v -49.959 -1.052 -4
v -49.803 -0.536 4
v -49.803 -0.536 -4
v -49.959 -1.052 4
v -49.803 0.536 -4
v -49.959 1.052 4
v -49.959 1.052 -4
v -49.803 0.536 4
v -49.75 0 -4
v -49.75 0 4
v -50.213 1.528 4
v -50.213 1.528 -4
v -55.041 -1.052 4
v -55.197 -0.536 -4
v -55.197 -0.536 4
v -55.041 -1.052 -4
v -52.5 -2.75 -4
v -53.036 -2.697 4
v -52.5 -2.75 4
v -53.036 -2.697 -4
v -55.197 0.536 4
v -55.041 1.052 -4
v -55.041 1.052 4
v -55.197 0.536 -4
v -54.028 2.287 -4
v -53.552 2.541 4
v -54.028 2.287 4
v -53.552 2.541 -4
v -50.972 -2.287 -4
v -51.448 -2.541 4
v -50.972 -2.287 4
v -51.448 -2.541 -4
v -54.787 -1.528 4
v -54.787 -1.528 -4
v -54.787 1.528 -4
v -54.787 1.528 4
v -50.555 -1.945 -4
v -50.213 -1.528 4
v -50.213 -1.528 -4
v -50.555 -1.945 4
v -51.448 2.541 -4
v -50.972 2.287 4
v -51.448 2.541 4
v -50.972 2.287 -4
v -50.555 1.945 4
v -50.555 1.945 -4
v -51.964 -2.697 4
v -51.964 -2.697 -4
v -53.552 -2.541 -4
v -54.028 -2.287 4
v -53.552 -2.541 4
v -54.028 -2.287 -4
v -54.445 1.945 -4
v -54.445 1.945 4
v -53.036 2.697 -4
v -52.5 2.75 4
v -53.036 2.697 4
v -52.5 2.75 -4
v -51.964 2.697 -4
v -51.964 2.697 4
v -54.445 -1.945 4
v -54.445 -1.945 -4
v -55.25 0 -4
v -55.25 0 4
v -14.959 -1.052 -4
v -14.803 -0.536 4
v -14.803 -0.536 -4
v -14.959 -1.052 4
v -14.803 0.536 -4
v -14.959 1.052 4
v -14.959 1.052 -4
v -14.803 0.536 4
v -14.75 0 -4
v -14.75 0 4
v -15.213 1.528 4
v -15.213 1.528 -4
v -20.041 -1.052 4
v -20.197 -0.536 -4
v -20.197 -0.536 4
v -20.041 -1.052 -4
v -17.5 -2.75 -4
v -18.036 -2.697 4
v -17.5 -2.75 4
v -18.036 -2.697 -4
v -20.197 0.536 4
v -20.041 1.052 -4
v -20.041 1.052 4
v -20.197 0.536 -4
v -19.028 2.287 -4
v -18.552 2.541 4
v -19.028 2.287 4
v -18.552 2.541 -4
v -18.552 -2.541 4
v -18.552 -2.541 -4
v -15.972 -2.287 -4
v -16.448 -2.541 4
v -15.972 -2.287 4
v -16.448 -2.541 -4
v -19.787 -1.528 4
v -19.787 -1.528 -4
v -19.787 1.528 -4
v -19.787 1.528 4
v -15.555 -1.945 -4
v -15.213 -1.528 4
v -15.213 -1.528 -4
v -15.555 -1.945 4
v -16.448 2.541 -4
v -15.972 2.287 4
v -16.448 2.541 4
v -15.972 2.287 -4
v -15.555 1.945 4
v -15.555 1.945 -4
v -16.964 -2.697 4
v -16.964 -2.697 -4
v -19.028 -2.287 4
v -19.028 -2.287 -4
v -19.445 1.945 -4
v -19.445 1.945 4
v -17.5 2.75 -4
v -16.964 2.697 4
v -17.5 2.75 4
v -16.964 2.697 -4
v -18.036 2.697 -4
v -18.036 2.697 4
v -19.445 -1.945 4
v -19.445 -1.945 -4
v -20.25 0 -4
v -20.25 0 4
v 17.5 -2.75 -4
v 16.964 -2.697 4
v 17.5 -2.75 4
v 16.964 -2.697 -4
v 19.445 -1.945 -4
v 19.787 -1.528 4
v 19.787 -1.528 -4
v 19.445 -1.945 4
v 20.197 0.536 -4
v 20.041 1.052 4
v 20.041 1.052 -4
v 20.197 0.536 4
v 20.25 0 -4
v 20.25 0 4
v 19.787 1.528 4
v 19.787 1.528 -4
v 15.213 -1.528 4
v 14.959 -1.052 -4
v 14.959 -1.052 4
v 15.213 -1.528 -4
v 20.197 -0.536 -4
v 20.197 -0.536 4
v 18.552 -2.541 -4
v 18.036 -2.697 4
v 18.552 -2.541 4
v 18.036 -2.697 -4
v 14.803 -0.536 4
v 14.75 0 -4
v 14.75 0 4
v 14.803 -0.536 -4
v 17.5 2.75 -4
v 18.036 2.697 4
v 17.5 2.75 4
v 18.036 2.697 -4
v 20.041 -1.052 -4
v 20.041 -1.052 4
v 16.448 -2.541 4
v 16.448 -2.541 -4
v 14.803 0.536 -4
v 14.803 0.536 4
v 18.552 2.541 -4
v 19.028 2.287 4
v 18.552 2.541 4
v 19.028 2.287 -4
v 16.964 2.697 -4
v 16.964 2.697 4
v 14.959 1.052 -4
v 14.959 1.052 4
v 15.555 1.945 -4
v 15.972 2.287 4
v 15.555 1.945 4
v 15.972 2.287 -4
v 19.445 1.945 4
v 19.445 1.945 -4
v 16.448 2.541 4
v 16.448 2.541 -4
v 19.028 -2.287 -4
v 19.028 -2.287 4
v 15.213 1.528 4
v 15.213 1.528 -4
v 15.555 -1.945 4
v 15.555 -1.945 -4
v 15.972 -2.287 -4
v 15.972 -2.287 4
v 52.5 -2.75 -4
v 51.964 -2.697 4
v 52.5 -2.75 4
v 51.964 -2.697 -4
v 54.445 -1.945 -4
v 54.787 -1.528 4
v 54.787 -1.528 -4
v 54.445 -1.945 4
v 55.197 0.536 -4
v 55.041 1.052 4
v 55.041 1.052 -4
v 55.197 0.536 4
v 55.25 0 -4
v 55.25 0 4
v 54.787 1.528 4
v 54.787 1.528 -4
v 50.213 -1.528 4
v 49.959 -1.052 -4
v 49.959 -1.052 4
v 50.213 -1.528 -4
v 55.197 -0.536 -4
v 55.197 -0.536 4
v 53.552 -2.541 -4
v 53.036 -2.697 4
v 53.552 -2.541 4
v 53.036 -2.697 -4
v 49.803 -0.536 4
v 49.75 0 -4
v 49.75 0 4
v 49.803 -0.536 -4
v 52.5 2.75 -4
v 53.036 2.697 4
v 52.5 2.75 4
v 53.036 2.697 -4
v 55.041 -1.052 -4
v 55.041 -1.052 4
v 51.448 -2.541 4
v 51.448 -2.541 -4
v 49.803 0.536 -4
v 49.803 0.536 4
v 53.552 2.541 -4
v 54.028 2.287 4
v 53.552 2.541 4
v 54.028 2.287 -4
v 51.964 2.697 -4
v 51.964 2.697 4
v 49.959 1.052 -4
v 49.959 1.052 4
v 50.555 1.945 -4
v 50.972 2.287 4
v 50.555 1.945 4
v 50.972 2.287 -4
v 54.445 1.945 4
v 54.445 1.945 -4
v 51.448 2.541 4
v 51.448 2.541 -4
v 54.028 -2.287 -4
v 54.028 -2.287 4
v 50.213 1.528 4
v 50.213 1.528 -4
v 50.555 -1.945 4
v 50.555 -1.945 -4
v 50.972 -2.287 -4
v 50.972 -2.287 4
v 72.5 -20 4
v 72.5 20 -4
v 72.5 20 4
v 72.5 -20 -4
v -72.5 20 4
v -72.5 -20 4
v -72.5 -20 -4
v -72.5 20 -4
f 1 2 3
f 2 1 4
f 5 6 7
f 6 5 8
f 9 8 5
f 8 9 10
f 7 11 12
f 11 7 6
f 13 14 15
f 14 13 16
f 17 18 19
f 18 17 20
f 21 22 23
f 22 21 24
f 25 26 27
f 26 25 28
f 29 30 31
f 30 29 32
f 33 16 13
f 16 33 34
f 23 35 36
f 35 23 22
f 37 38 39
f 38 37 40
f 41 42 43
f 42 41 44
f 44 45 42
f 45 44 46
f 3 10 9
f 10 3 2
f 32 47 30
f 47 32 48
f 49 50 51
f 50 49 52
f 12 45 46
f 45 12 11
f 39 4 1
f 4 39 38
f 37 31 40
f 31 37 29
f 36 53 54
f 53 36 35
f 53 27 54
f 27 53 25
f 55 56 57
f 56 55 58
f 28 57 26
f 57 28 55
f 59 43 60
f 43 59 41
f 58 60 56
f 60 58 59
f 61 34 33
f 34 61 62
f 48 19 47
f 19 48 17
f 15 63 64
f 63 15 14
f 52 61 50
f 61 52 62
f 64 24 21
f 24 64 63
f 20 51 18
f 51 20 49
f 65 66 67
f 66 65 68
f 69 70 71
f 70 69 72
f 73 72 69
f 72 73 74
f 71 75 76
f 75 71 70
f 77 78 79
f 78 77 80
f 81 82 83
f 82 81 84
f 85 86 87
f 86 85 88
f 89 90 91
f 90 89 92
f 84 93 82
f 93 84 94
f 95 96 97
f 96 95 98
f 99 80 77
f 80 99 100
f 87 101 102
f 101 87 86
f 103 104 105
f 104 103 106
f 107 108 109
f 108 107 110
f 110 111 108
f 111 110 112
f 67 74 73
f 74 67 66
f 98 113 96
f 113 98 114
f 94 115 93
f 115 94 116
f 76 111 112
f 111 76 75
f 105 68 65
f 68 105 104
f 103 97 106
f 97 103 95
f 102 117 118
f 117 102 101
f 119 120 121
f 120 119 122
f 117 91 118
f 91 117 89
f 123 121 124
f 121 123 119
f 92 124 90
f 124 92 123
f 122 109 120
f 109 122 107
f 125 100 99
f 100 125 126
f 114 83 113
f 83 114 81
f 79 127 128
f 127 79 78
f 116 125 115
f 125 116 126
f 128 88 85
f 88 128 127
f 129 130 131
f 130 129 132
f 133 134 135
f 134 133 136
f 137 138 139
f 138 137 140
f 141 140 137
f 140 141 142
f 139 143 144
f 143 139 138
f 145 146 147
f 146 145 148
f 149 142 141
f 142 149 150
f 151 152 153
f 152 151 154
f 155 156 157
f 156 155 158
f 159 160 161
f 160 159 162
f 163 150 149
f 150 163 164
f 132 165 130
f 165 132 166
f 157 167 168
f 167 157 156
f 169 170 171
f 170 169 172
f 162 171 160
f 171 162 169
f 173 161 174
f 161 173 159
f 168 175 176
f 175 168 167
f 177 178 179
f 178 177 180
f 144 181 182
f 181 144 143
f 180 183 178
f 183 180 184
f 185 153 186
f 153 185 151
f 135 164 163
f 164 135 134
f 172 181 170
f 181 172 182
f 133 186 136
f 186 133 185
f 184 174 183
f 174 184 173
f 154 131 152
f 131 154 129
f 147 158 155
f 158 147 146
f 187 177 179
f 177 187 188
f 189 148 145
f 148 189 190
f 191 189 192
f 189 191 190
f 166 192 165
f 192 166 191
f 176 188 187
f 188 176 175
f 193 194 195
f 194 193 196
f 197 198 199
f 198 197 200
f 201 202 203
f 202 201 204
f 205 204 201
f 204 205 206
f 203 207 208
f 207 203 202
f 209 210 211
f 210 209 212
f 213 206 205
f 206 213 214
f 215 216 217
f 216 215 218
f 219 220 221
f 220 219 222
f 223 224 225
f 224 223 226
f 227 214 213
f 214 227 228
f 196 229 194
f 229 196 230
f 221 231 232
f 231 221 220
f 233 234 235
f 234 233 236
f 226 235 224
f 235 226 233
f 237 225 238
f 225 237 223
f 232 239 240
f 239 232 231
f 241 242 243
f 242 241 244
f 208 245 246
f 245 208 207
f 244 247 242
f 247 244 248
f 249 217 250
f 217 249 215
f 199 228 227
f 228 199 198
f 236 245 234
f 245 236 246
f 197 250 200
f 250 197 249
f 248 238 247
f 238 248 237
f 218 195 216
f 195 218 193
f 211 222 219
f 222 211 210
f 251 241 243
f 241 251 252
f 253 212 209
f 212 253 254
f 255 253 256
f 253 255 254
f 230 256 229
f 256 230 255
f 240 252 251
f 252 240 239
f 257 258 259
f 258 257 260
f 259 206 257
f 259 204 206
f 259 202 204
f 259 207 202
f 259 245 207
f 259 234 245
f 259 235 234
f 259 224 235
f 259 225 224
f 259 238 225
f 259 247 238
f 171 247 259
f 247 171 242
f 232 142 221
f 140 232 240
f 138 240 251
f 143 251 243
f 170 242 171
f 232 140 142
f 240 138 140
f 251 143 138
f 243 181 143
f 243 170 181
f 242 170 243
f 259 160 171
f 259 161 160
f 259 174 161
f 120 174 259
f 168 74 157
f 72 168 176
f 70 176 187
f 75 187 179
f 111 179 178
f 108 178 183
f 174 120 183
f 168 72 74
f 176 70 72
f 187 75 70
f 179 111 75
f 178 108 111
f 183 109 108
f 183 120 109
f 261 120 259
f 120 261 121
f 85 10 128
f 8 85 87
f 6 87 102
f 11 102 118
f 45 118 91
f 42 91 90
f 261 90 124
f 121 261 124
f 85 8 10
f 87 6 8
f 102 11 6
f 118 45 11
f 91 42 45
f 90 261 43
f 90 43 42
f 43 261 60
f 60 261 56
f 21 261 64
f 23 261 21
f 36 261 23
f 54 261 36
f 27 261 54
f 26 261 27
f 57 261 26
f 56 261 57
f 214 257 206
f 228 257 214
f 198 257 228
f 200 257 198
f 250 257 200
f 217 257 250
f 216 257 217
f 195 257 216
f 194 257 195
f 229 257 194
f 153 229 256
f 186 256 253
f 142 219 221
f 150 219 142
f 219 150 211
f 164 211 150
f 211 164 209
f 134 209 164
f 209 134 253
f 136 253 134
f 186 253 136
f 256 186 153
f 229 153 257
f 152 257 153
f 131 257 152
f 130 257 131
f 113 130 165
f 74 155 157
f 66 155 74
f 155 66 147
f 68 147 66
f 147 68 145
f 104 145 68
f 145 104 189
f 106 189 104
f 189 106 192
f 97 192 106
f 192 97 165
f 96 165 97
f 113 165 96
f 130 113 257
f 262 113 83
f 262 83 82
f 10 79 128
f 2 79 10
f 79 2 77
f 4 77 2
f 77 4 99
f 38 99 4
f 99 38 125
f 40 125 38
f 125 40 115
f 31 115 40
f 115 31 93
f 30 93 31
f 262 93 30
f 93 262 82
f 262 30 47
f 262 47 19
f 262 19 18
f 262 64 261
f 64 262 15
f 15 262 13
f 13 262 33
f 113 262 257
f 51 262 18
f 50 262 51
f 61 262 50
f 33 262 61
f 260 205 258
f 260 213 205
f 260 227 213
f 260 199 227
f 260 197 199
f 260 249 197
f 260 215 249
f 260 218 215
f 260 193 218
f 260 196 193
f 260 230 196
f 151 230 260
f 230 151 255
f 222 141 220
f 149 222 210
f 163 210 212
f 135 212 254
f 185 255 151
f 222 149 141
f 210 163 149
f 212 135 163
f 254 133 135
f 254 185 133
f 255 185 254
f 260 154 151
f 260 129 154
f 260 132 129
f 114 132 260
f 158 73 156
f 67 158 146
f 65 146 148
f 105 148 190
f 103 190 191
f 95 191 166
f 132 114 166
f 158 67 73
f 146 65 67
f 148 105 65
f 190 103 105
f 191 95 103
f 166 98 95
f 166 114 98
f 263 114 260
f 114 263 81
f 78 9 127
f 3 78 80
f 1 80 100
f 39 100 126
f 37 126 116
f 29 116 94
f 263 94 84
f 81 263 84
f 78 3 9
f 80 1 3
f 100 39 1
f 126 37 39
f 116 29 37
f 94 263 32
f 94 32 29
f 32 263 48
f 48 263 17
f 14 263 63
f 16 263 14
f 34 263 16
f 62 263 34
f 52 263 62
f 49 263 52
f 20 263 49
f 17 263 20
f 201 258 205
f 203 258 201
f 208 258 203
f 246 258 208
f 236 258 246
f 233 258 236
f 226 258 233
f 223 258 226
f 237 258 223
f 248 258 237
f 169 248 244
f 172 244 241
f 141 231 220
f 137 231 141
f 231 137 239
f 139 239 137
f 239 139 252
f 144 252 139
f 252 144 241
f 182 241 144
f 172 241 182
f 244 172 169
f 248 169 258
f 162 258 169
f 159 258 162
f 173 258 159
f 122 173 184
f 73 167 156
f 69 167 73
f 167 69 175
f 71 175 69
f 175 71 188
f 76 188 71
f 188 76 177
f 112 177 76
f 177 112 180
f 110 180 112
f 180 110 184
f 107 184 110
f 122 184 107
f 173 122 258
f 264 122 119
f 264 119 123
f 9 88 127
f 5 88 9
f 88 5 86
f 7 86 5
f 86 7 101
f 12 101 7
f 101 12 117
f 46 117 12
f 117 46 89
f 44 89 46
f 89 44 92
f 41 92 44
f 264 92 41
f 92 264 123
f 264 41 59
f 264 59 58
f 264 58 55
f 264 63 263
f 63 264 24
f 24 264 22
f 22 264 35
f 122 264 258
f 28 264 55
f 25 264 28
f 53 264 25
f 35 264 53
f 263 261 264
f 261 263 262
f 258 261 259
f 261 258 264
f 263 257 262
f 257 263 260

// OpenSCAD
$fn = 32;

// ----------------------------------------------------------------------
// Hole bar, 4 x Ø5.5
// skip layout, 20 mm edge offset
// ----------------------------------------------------------------------

// --- parameters (mm) ---
bar_w = 40;         // bar width (Y)
bar_t = 8;          // bar thickness (Z)
holes = 4;          // holes per row
hole_d = 5.5;       // hole diameter
edge = 20;          // offset from the bar end to the first hole
grid_pitch = 17.5;  // grid the bar was laid out on

// --- derived feature positions (mm) ---
pitch = grid_pitch * 2;       // = 35   holes sit every other grid slot
span = (holes - 1) * pitch;   // = 105   distance between the end holes
bar_l = span + 2 * edge;      // = 145   overall bar length
start_x = -bar_l / 2 + edge;  // = -52.5   X of the first hole
feature_centers = [
  [start_x + 0 * pitch, 0],
  [start_x + 1 * pitch, 0],
  [start_x + 2 * pitch, 0],
  [start_x + 3 * pitch, 0]
];   // hole centres of the first row

// bar with one row of holes, drilled from feature_centers
difference() {
  translate([-bar_l / 2, -bar_w / 2, -bar_t / 2]) cube([bar_l, bar_w, bar_t]);
  for (centre = feature_centers)
    translate([centre[0], centre[1], 0])
      cylinder(d = hole_d, h = bar_t + 2, center = true);
}
